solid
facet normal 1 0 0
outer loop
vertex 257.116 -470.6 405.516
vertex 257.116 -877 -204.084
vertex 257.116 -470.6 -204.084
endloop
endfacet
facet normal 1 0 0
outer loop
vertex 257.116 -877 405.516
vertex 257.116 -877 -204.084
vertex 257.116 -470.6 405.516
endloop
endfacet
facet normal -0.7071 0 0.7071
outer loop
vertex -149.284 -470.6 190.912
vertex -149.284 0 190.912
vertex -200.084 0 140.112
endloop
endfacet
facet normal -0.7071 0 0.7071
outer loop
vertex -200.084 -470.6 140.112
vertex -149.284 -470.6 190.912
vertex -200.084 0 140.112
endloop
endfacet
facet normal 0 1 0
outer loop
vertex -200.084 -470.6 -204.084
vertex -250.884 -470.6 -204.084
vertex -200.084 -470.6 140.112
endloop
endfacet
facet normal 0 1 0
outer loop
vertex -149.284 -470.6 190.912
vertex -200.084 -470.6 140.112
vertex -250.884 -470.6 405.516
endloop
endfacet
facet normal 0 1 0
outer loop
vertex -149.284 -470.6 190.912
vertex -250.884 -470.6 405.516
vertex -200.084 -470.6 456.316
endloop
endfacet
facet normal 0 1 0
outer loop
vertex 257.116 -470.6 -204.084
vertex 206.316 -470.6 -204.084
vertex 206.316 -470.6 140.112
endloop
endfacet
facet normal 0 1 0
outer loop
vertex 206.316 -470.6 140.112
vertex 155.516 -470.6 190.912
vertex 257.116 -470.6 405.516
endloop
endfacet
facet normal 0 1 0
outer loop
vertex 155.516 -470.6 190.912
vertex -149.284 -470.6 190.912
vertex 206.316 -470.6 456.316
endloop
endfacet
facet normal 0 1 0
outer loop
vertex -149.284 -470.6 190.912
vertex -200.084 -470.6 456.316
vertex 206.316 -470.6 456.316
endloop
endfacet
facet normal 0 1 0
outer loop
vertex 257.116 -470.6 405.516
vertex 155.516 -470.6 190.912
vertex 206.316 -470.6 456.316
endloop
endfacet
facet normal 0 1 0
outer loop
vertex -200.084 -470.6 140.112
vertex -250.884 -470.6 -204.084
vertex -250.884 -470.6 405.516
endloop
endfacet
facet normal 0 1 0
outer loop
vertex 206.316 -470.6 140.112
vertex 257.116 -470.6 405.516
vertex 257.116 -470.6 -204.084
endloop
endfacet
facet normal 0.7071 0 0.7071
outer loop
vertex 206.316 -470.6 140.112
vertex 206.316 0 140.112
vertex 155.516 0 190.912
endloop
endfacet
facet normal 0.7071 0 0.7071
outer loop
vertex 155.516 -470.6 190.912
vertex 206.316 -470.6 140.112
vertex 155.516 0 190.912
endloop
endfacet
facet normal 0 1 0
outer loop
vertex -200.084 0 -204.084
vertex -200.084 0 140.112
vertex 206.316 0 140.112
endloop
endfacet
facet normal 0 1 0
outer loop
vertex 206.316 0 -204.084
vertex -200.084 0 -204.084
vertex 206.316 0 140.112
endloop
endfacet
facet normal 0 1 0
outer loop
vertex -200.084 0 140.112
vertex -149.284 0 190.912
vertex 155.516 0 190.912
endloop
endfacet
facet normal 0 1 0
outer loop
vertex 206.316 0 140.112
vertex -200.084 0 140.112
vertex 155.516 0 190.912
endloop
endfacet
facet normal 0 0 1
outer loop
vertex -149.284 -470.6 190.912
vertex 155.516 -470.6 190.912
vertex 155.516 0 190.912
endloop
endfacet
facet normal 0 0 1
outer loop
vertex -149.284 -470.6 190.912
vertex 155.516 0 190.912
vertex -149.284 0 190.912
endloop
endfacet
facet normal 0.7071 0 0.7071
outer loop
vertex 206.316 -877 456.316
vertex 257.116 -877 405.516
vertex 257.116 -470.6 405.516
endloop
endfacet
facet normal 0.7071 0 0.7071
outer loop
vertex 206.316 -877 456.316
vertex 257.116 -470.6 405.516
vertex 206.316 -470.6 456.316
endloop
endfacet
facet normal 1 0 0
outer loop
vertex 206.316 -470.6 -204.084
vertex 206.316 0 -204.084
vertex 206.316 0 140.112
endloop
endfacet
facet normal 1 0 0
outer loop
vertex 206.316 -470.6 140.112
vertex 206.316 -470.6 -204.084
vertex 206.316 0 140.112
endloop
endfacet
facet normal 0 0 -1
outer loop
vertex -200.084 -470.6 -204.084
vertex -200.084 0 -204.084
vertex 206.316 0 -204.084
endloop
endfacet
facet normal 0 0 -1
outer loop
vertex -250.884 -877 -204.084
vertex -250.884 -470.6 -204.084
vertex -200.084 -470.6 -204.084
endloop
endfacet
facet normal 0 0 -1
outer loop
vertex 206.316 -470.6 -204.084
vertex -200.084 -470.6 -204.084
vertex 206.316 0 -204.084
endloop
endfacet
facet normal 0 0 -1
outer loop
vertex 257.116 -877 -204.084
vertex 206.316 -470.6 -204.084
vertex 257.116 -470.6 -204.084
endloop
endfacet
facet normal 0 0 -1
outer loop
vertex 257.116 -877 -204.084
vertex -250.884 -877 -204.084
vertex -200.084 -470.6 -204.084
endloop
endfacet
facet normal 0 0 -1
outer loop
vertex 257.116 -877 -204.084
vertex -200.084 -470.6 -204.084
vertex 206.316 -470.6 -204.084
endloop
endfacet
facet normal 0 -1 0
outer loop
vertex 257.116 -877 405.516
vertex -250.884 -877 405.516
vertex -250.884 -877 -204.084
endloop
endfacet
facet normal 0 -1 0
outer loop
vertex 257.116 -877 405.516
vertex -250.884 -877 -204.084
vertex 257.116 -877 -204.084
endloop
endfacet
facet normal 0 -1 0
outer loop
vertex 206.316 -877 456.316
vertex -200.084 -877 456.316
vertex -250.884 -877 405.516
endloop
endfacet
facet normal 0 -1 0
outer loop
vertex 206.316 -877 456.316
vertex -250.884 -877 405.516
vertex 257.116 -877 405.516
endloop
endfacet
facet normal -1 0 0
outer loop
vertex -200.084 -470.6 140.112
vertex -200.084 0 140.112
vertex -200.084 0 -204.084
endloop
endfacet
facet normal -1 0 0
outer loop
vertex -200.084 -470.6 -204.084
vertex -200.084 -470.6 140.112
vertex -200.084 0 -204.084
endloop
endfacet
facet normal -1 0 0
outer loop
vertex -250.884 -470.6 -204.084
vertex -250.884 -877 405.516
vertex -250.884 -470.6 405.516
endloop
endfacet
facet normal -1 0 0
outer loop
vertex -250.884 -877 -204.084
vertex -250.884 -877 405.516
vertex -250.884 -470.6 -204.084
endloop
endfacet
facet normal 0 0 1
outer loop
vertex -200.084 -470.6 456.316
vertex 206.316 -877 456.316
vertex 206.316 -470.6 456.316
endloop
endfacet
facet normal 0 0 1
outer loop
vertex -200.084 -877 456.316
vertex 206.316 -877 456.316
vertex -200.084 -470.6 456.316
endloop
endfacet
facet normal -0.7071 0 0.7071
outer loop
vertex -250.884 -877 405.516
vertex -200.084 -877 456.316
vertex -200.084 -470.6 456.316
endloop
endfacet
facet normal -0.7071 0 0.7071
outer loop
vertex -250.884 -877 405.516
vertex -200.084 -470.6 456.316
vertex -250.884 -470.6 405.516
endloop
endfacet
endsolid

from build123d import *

# Parameters (mm, degrees)
F1_DEPTH = 877
F3_DEPTH = 406.4


with BuildPart() as f1:
    # F0 (on Front) → F1 (new body)
    with BuildSketch(Plane.XZ):
        Polygon((-200.083994, 140.112044), (-200.083994, -204.083866), (206.316006, -204.083866), (206.316006, 140.112044), (155.516006, 190.912044), (-149.283994, 190.912044), align=None)
    extrude(amount=F1_DEPTH)

    # F2 (on face) → F3 (join)
    with BuildSketch(Plane.XZ.offset(877)):
        Polygon((-250.883994, 405.516134), (-250.883994, -204.083866), (-200.083994, -204.083866), (-200.083994, 140.112044), (-149.283994, 190.912044), (155.516006, 190.912044), (206.316006, 140.112044), (206.316006, -204.083866), (257.116006, -204.083866), (257.116006, 405.516134), (206.316006, 456.316134), (-200.083994, 456.316134), align=None)
    extrude(amount=-F3_DEPTH)


solid = f1.part
